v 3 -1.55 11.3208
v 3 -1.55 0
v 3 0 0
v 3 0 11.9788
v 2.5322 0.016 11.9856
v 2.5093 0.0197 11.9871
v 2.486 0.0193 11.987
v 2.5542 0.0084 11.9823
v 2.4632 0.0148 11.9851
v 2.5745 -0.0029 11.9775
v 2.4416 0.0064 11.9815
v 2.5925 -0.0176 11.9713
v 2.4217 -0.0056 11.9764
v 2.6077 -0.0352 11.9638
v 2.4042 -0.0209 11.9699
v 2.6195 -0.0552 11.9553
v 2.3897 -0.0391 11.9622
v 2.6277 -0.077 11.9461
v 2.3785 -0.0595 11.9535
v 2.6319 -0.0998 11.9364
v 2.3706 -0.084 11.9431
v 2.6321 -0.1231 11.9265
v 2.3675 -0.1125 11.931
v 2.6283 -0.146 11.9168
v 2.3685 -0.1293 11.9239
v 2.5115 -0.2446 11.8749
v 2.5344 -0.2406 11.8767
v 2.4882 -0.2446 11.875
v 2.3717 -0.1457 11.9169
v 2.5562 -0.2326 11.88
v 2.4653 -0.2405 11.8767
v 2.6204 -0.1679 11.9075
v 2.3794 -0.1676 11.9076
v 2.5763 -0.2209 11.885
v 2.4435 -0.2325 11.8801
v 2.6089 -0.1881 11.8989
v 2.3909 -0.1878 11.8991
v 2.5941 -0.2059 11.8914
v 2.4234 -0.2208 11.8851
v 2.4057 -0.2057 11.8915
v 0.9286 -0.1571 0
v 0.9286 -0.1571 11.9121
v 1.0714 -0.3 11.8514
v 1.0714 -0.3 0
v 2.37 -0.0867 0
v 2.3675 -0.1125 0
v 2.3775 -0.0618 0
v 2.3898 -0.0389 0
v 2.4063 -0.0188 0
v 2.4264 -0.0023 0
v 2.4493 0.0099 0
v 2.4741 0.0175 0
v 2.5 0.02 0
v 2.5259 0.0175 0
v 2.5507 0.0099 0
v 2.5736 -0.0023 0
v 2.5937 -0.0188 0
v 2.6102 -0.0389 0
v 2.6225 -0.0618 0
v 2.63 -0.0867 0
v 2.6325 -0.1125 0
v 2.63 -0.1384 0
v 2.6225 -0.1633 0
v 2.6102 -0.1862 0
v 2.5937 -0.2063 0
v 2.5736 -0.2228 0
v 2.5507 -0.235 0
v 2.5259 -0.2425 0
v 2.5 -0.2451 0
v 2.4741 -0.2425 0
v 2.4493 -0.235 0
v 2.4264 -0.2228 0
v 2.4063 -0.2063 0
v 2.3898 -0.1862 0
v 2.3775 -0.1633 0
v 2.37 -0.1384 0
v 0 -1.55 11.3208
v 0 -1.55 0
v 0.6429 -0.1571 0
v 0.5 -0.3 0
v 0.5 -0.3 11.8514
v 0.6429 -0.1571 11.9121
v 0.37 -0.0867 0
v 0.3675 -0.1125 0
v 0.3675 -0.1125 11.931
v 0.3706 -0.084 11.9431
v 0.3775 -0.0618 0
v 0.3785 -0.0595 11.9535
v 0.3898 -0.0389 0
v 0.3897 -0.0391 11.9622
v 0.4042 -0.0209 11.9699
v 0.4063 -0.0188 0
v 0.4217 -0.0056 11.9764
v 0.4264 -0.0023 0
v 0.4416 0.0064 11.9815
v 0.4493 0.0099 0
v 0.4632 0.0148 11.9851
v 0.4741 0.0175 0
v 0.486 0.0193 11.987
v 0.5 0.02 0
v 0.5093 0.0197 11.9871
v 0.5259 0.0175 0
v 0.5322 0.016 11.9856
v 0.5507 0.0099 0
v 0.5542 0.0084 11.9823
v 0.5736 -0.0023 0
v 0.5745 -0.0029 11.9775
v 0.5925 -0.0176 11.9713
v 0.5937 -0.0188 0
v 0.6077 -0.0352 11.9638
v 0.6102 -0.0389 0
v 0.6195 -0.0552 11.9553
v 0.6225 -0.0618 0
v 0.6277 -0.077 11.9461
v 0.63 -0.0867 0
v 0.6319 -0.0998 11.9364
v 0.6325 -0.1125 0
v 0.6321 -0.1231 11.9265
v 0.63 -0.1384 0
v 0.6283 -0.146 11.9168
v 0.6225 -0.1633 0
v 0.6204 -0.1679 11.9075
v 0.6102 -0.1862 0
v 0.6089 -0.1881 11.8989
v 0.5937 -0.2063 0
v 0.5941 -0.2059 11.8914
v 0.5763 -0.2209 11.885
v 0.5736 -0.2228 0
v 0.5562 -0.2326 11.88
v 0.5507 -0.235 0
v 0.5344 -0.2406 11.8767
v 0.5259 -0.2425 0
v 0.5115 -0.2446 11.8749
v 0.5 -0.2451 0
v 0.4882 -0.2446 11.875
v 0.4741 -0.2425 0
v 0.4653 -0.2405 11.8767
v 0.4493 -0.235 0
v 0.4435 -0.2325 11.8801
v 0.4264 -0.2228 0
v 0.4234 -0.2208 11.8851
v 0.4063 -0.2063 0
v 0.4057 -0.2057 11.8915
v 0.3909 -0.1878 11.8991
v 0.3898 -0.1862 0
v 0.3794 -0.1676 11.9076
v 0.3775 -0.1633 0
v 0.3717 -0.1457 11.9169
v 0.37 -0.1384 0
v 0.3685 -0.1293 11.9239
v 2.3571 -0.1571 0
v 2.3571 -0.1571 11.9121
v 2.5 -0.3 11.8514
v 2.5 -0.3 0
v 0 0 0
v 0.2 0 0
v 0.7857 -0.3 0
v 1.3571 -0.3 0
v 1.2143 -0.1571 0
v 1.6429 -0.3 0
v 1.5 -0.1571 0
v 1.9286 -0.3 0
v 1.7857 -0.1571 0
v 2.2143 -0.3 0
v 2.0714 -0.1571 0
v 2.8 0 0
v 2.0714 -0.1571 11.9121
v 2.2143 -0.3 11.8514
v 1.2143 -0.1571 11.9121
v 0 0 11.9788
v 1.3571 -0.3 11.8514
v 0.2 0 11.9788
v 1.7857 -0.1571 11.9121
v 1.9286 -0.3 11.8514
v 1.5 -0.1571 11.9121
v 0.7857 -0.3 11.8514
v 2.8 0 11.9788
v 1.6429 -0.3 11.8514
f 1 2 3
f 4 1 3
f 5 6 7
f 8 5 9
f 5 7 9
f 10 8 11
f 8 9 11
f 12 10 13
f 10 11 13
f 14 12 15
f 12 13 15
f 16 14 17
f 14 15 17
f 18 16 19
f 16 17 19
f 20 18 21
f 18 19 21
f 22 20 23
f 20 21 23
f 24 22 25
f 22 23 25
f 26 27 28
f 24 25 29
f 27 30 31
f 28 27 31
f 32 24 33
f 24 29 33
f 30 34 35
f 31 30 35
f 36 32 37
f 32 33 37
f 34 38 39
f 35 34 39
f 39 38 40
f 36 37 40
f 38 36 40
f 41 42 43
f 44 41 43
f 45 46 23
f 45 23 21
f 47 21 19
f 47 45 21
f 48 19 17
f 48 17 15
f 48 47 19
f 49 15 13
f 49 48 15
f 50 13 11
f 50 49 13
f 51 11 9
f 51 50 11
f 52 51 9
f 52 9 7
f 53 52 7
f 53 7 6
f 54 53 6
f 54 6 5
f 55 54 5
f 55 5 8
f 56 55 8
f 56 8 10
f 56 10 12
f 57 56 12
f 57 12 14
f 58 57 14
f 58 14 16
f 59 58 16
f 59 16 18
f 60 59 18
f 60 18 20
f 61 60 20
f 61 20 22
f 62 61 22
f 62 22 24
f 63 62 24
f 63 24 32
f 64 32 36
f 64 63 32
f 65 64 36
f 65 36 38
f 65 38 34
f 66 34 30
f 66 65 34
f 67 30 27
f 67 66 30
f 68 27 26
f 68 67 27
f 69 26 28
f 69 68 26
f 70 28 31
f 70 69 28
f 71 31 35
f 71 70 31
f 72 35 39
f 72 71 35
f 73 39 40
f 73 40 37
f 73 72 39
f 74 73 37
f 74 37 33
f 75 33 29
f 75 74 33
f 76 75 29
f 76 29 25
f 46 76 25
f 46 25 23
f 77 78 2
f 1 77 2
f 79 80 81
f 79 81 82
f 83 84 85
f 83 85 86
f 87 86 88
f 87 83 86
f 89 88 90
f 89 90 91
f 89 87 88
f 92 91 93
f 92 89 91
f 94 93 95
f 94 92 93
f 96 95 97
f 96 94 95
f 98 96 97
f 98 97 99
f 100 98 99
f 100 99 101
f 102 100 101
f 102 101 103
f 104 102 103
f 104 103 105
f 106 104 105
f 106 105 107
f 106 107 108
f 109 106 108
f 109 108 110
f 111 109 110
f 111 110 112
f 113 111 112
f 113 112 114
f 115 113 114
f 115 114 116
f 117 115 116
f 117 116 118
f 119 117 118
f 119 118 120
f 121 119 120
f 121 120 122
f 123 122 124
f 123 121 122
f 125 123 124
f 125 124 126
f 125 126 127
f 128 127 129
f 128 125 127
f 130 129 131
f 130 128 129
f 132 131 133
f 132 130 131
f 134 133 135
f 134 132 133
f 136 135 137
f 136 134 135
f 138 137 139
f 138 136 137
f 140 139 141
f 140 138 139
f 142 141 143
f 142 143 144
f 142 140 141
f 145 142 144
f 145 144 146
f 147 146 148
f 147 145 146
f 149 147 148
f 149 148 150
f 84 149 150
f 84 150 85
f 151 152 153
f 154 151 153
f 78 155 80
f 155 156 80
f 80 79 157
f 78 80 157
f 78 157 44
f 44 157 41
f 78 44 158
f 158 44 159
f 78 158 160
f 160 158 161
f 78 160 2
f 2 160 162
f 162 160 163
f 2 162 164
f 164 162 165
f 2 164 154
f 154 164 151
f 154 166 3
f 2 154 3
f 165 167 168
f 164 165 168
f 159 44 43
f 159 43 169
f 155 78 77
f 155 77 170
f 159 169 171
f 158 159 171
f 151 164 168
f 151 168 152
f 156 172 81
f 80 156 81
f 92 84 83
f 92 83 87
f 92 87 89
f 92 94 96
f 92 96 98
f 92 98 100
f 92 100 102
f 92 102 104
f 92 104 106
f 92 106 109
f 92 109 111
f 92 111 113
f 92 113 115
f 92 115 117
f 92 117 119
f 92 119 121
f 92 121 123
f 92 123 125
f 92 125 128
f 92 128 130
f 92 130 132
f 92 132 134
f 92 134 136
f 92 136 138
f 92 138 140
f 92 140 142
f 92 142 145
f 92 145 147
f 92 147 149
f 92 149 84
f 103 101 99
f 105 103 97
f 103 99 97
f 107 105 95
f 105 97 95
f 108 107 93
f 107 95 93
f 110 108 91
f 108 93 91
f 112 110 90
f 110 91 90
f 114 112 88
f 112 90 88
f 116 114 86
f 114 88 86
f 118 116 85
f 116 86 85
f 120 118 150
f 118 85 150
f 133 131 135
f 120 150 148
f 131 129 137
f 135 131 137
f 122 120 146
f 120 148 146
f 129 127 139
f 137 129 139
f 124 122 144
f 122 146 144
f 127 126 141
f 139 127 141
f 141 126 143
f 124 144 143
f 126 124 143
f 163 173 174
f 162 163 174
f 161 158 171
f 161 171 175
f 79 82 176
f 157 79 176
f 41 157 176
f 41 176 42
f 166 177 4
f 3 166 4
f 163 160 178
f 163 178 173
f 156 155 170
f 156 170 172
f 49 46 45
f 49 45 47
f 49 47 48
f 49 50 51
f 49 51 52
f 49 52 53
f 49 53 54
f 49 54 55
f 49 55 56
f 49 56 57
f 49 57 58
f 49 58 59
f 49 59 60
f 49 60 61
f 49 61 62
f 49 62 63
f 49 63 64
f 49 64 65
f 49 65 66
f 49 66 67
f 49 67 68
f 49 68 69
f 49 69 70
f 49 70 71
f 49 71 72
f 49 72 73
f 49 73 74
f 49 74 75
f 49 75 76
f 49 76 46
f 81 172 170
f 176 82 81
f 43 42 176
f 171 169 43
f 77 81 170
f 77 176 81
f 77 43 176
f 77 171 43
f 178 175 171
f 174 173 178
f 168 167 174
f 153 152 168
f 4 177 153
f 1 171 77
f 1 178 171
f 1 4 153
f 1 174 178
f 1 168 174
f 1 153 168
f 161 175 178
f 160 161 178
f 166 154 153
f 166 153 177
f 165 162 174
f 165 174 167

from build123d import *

# Parameters (mm, degrees)
SKETCH1_W           = 3
SKETCH1_H           = 1.55
BOSS_EXTRUDE1_DEPTH = 12
CUT_EXTRUDE1_DEPTH  = 13.466053907
SKETCH4_W           = 3
SKETCH4_H           = 0.03
BOSS_EXTRUDE2_DEPTH = 12
CUT_EXTRUDE2_DEPTH  = 13.466053907
BOSS_EXTRUDE3_REACH = 14.466
SKETCH6_R           = 0.13254834
SKETCH7_W           = 3
SKETCH7_H           = 0.03
CUT_EXTRUDE3_DEPTH  = 13.466053907


with BuildPart() as part:
    # Sketch1 → Boss-Extrude1 (new body)
    with BuildSketch(Plane.XY):
        with Locations((1.5, -0.775)):
            Rectangle(SKETCH1_W, SKETCH1_H)
    extrude(amount=BOSS_EXTRUDE1_DEPTH)

    # Sketch2 → Cut-Extrude1 (cut, through all)
    with BuildSketch(Plane.XY.offset(12)):
        Polygon((0.2, 0), (0.5, -0.3), (0.642857143, -0.157142857), (0.785714286, -0.3), (0.928571429, -0.157142857), (1.071428571, -0.3), (1.214285714, -0.157142857), (1.357142857, -0.3), (1.5, -0.157142857), (1.642857143, -0.3), (1.785714286, -0.157142857), (1.928571429, -0.3), (2.071428571, -0.157142857), (2.214285714, -0.3), (2.357142857, -0.157142857), (2.5, -0.3), (2.8, 0), align=None)
    extrude(amount=-CUT_EXTRUDE1_DEPTH, mode=Mode.SUBTRACT)


with BuildPart() as body_2:
    # Sketch4 → Boss-Extrude2 (new body)
    with BuildSketch(Plane.XY.offset(12)):
        with Locations((1.5, 0.035)):
            Rectangle(SKETCH4_W, SKETCH4_H)
    extrude(amount=-BOSS_EXTRUDE2_DEPTH)


with BuildPart() as cut_extrude2_tool:
    # Sketch5 → Cut-Extrude2 (new, through all)
    with BuildSketch(Plane(origin=(3, 0, 0), x_dir=(0, 0, -1), z_dir=(1, 0, 0))):
        Polygon((-12, 0.05), (-11.320840294, -1.55), (-12, -1.55), align=None)
    extrude(amount=-CUT_EXTRUDE2_DEPTH)


with BuildPart() as part_1:
    add(part.part)

    # Cut-Extrude2: cut by cut_extrude2_tool
    add(cut_extrude2_tool.part, mode=Mode.SUBTRACT)


with BuildPart() as body_2_1:
    add(body_2.part)

    # Cut-Extrude2: cut by cut_extrude2_tool
    add(cut_extrude2_tool.part, mode=Mode.SUBTRACT)

    # Sketch7 → Cut-Extrude3 (cut, through all)
    with BuildSketch(Plane(origin=(0, 0, 0), x_dir=(-1, 0, 0), z_dir=(0, 0, -1))):
        with Locations((-1.5, 0.035)):
            Rectangle(SKETCH7_W, SKETCH7_H)
    extrude(amount=-CUT_EXTRUDE3_DEPTH, mode=Mode.SUBTRACT)


with BuildPart() as body_3:
    # Boss-Extrude3: up to this plane
    boss_extrude3_end = Plane(origin=(0, 0.05, 12), z_dir=(0, 0.39073112848926705, -0.9205048534524433))
    # Sketch6 → Boss-Extrude3 (new, up to the surface)
    with BuildSketch(Plane(origin=(0, 0, 0), x_dir=(-1, 0, 0), z_dir=(0, 0, -1)), mode=Mode.PRIVATE) as boss_extrude3_sk1:
        with Locations((-2.5, -0.11254834)):
            Circle(SKETCH6_R)
    boss_extrude3_tool1 = split(extrude(boss_extrude3_sk1.sketch, amount=-BOSS_EXTRUDE3_REACH, mode=Mode.PRIVATE), bisect_by=boss_extrude3_end, keep=Keep.BOTH, mode=Mode.PRIVATE)
    add(boss_extrude3_tool1.solids().sort_by_distance((2.5, -0.112548, 0))[0])
    # Sketch6 → Boss-Extrude3 (new, up to the surface)
    with BuildSketch(Plane(origin=(0, 0, 0), x_dir=(-1, 0, 0), z_dir=(0, 0, -1)), mode=Mode.PRIVATE) as boss_extrude3_sk2:
        with Locations((-0.5, -0.11254834)):
            Circle(SKETCH6_R)
    boss_extrude3_tool2 = split(extrude(boss_extrude3_sk2.sketch, amount=-BOSS_EXTRUDE3_REACH, mode=Mode.PRIVATE), bisect_by=boss_extrude3_end, keep=Keep.BOTH, mode=Mode.PRIVATE)
    add(boss_extrude3_tool2.solids().sort_by_distance((0.5, -0.112548, 0))[0])


solid = Compound([part_1.part, body_3.part])
